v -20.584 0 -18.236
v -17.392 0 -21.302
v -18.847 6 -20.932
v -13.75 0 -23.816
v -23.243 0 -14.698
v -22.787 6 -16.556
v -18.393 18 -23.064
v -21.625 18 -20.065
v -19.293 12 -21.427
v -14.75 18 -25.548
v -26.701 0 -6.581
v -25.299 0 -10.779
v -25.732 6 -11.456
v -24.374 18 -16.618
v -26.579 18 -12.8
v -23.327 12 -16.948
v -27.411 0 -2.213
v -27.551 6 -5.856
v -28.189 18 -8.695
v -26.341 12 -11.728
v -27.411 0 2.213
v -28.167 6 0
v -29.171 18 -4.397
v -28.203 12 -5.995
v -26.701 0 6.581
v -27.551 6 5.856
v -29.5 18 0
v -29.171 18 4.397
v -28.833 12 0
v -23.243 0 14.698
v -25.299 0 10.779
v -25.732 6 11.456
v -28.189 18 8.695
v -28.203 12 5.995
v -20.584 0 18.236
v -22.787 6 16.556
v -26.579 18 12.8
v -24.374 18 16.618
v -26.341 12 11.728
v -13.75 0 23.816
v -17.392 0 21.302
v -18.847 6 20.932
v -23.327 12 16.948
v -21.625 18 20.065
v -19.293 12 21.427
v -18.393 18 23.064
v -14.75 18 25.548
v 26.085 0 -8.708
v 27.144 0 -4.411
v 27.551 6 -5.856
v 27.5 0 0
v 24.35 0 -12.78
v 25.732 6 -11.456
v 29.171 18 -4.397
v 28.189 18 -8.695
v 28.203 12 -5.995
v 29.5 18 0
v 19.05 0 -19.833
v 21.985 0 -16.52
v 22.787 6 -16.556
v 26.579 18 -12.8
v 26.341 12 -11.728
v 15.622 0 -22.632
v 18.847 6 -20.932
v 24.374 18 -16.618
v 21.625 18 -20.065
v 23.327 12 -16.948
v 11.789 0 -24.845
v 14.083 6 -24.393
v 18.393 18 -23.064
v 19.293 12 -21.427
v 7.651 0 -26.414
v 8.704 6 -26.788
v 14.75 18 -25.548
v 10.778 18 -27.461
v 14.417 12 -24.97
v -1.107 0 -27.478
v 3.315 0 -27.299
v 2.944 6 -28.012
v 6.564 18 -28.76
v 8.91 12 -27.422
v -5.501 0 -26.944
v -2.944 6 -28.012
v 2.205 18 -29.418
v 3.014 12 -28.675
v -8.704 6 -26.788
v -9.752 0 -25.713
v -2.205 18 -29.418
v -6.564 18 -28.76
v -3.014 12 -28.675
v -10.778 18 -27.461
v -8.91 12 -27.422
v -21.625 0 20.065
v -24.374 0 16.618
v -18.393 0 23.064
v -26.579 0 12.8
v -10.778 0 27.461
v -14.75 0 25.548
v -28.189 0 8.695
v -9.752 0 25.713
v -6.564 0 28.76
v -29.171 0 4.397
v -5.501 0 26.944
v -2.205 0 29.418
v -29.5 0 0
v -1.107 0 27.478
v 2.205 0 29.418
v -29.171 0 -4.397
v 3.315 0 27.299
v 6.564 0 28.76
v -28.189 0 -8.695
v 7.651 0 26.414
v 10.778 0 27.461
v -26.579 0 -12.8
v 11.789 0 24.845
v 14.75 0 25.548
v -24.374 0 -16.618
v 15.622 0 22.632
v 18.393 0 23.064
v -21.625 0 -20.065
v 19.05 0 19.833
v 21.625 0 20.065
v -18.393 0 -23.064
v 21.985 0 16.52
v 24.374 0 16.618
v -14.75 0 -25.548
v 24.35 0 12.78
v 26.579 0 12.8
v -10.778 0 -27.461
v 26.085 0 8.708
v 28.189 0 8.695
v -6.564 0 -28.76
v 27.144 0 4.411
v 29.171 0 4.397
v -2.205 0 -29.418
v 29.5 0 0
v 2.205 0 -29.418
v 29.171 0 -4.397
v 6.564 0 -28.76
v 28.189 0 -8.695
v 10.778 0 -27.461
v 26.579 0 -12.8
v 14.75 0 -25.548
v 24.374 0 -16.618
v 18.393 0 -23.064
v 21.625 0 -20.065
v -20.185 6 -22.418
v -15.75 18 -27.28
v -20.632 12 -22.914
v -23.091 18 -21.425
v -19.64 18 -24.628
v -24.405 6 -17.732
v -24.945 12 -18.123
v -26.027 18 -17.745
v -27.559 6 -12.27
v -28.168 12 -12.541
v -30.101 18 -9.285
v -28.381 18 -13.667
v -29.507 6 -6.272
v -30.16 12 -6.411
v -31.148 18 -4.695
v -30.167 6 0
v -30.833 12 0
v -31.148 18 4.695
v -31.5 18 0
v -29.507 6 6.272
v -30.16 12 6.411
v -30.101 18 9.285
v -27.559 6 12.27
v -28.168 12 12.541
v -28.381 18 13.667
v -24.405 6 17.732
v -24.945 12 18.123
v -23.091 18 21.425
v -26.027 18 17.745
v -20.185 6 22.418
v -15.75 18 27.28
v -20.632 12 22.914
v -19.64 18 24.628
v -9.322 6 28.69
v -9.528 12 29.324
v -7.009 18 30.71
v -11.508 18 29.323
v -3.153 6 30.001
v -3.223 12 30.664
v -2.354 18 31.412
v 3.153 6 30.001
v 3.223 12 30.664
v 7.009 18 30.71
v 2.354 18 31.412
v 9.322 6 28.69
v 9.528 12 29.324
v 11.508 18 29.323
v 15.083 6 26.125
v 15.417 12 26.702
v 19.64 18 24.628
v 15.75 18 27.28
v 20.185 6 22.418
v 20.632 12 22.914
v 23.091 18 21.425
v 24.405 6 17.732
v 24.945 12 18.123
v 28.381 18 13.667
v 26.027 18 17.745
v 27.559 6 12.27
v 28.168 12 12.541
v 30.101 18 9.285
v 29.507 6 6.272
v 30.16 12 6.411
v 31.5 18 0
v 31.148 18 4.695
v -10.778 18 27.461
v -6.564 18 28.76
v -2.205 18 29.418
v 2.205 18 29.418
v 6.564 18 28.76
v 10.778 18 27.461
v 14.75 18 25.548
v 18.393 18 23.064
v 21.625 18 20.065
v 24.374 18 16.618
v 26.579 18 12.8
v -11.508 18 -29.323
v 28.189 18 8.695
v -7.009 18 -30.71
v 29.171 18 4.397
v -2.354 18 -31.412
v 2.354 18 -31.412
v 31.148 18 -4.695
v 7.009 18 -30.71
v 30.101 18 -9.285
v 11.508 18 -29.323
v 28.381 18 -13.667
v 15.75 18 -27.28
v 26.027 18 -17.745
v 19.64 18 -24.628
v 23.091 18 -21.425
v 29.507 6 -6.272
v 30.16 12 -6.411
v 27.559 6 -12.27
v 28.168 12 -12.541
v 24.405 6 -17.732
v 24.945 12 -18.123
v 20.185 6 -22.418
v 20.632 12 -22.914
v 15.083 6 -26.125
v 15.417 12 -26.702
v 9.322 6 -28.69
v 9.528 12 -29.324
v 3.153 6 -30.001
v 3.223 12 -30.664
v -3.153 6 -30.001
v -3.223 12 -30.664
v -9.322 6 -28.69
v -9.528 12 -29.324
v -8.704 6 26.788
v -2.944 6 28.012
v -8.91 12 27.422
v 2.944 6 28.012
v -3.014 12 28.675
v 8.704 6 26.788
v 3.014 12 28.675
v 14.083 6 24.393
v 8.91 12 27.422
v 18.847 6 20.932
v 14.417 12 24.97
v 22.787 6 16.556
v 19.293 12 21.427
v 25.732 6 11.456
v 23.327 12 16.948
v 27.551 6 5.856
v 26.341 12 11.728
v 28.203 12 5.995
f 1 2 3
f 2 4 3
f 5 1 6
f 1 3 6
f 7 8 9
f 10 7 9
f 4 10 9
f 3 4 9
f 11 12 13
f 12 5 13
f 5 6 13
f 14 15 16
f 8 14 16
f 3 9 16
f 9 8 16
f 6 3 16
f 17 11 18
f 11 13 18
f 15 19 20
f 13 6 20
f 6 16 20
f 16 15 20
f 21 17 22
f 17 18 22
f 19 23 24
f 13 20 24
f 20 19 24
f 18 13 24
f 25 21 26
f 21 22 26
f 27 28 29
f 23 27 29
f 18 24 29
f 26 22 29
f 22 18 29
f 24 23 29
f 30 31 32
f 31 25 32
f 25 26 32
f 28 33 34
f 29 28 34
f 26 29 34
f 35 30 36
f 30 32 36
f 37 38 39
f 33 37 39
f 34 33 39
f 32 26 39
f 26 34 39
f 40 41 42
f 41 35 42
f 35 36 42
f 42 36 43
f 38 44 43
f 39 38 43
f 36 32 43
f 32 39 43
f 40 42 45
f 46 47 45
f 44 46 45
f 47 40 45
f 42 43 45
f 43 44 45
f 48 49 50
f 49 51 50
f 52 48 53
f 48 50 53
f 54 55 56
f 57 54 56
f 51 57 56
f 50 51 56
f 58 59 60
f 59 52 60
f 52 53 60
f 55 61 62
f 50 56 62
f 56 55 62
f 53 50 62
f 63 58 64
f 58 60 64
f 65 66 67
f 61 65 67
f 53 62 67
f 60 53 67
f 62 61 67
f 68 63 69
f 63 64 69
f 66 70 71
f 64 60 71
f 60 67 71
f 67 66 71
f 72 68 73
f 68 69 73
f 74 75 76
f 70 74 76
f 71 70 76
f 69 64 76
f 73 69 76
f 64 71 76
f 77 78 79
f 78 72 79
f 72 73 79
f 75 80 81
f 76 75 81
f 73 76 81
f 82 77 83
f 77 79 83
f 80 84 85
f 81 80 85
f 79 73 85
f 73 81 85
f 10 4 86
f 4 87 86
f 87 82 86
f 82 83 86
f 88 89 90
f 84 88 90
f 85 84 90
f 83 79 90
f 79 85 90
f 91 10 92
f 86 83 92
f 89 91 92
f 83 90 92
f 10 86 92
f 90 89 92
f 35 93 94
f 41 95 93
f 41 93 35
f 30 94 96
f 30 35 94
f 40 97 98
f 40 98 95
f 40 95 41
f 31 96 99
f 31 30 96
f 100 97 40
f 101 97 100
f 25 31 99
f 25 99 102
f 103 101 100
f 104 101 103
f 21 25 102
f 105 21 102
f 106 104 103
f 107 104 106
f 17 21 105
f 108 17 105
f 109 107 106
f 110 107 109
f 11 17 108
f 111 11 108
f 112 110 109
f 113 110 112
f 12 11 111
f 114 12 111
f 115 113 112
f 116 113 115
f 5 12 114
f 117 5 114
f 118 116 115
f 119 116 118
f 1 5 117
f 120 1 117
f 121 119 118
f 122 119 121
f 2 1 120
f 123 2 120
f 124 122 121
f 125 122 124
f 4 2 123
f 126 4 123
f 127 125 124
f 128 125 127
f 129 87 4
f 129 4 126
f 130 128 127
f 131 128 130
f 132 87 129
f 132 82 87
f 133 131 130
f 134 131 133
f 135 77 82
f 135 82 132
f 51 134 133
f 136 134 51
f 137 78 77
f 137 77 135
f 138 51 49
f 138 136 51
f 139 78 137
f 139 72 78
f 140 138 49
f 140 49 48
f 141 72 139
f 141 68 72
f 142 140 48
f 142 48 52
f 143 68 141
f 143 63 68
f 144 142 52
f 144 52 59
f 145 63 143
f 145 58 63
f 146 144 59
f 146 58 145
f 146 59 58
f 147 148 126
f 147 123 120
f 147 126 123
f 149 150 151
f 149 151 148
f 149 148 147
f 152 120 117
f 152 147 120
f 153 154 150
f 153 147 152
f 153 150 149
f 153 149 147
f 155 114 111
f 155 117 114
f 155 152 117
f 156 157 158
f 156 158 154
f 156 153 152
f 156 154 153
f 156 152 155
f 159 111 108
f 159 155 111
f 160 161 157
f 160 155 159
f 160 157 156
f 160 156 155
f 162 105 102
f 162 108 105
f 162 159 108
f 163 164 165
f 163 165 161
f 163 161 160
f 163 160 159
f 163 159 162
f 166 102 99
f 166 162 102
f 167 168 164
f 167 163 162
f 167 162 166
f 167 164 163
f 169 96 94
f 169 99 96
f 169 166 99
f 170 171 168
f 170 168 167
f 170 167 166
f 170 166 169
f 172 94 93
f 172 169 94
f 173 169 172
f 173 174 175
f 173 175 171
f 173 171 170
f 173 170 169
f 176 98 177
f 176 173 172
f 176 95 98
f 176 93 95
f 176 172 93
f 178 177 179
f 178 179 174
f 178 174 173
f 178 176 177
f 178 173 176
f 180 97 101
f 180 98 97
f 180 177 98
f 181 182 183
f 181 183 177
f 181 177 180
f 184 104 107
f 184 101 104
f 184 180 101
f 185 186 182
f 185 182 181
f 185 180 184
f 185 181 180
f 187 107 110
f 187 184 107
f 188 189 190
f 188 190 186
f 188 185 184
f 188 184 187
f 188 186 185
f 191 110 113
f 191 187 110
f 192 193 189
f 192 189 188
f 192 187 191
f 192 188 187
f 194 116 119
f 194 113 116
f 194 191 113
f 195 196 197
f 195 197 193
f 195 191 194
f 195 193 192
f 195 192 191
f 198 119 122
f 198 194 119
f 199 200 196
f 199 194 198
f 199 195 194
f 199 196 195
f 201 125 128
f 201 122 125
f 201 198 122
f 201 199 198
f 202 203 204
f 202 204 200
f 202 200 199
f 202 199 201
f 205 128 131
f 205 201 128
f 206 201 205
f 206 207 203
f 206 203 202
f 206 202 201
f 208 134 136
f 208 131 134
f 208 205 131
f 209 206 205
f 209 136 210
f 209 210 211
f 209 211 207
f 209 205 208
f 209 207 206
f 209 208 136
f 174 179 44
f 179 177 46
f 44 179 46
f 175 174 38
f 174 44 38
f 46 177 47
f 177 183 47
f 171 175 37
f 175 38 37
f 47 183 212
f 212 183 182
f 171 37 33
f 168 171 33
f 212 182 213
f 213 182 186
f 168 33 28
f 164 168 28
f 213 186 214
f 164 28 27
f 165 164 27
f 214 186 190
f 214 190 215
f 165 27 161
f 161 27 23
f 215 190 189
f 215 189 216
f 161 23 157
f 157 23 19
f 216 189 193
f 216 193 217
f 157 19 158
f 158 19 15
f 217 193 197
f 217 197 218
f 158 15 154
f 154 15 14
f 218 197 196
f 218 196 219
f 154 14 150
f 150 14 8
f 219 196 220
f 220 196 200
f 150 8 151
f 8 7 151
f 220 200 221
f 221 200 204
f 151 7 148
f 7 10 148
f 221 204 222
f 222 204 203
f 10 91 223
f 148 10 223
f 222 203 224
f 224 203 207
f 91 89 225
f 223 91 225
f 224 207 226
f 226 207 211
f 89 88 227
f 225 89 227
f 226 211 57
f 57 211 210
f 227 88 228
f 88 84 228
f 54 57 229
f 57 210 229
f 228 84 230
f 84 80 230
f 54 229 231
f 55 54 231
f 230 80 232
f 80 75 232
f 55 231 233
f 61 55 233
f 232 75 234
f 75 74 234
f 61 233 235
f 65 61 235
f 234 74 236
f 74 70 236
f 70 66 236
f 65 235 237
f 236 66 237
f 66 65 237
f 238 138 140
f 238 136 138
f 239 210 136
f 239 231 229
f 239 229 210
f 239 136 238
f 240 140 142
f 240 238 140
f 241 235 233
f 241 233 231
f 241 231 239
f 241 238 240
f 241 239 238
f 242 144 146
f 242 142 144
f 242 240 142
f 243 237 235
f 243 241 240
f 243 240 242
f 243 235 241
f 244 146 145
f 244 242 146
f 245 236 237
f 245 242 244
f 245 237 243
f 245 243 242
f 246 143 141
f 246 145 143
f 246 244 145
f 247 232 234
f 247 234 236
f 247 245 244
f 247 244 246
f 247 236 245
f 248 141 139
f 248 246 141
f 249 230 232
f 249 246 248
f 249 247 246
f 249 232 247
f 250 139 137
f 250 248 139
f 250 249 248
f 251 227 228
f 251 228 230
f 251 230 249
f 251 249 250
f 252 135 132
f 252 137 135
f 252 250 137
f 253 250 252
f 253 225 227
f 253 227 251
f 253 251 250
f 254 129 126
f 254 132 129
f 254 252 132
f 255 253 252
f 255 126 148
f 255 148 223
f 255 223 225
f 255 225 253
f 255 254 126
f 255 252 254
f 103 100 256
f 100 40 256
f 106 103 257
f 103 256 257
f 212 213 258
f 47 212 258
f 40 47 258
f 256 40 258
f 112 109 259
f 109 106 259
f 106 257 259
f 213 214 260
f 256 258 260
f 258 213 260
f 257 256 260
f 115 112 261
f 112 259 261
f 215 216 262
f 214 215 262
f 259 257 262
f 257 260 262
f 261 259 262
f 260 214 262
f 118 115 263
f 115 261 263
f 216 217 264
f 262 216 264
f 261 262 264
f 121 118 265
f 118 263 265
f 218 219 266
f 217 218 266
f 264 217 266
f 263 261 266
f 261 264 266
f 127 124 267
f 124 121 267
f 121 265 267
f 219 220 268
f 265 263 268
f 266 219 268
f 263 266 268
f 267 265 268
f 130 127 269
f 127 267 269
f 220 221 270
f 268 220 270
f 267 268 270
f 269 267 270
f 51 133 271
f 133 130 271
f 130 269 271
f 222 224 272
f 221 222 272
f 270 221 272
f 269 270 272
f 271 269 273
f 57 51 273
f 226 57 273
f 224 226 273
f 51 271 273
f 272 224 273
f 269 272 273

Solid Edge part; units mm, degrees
sketch "Sketch1" plane through (0, 0, 0) normal (0, -1, 0) x (1, 0, 0)
  circle A0 centre (0, 0) radius 31.5
  dimension "D1" = 63
extrude "Protrusion1" add sketch "Sketch1" against normal blind 18
sketch "Sketch2" plane through (0, 0, 0) normal (0, -1, 0) x (1, 0, 0)
  circle A0 centre (0, 0) radius 27.5
  dimension "D1" = 55
extrude "Cutout1" cut sketch "Sketch2" against normal through all
sketch "Sketch3" plane through (0, 0, 0) normal (0, 0, 1) x (1, 0, 0)
  line L0 (27.5, 0) -> (29.5, 18)
  line L1 (29.5, 18) -> (27.5, 18)
  line L2 (27.5, 18) -> (27.5, 0)
sketch3d "SweptCutout_4 path"
  arc A0 (27.5, 18, 0) -> (-13.75, 18, 23.8157) centre (0, 18, 0)
  arc A1 (-13.75, 18, 23.8157) -> (-13.75, 18, -23.8157) centre (0, 18, 0)
  arc A2 (-13.75, 18, -23.8157) -> (27.5, 18, 0) centre (0, 18, 0)
sweep "SweptCutout_4" cut profiles "Sketch3" path "SweptCutout_4 path"
sketch "Sketch4" plane through (0, 0, 0) normal (0, 0, 1) x (1, 0, 0)
  line L0 (31.5, 18) -> (29.5, 0)
  line L1 (29.5, 0) -> (31.5, 0)
  line L2 (31.5, 0) -> (31.5, 18)
  dimension "D1" = 2
sketch3d "SweptCutout_5 path"
  arc A0 (31.5, 0, 0) -> (-15.75, 0, 27.2798) centre (0, 0, 0)
  arc A1 (-15.75, 0, 27.2798) -> (-15.75, 0, -27.2798) centre (0, 0, 0)
  arc A2 (-15.75, 0, -27.2798) -> (31.5, 0, 0) centre (0, 0, 0)
sweep "SweptCutout_5" cut profiles "Sketch4" path "SweptCutout_5 path"
properties material "Aluminum, 1060"
